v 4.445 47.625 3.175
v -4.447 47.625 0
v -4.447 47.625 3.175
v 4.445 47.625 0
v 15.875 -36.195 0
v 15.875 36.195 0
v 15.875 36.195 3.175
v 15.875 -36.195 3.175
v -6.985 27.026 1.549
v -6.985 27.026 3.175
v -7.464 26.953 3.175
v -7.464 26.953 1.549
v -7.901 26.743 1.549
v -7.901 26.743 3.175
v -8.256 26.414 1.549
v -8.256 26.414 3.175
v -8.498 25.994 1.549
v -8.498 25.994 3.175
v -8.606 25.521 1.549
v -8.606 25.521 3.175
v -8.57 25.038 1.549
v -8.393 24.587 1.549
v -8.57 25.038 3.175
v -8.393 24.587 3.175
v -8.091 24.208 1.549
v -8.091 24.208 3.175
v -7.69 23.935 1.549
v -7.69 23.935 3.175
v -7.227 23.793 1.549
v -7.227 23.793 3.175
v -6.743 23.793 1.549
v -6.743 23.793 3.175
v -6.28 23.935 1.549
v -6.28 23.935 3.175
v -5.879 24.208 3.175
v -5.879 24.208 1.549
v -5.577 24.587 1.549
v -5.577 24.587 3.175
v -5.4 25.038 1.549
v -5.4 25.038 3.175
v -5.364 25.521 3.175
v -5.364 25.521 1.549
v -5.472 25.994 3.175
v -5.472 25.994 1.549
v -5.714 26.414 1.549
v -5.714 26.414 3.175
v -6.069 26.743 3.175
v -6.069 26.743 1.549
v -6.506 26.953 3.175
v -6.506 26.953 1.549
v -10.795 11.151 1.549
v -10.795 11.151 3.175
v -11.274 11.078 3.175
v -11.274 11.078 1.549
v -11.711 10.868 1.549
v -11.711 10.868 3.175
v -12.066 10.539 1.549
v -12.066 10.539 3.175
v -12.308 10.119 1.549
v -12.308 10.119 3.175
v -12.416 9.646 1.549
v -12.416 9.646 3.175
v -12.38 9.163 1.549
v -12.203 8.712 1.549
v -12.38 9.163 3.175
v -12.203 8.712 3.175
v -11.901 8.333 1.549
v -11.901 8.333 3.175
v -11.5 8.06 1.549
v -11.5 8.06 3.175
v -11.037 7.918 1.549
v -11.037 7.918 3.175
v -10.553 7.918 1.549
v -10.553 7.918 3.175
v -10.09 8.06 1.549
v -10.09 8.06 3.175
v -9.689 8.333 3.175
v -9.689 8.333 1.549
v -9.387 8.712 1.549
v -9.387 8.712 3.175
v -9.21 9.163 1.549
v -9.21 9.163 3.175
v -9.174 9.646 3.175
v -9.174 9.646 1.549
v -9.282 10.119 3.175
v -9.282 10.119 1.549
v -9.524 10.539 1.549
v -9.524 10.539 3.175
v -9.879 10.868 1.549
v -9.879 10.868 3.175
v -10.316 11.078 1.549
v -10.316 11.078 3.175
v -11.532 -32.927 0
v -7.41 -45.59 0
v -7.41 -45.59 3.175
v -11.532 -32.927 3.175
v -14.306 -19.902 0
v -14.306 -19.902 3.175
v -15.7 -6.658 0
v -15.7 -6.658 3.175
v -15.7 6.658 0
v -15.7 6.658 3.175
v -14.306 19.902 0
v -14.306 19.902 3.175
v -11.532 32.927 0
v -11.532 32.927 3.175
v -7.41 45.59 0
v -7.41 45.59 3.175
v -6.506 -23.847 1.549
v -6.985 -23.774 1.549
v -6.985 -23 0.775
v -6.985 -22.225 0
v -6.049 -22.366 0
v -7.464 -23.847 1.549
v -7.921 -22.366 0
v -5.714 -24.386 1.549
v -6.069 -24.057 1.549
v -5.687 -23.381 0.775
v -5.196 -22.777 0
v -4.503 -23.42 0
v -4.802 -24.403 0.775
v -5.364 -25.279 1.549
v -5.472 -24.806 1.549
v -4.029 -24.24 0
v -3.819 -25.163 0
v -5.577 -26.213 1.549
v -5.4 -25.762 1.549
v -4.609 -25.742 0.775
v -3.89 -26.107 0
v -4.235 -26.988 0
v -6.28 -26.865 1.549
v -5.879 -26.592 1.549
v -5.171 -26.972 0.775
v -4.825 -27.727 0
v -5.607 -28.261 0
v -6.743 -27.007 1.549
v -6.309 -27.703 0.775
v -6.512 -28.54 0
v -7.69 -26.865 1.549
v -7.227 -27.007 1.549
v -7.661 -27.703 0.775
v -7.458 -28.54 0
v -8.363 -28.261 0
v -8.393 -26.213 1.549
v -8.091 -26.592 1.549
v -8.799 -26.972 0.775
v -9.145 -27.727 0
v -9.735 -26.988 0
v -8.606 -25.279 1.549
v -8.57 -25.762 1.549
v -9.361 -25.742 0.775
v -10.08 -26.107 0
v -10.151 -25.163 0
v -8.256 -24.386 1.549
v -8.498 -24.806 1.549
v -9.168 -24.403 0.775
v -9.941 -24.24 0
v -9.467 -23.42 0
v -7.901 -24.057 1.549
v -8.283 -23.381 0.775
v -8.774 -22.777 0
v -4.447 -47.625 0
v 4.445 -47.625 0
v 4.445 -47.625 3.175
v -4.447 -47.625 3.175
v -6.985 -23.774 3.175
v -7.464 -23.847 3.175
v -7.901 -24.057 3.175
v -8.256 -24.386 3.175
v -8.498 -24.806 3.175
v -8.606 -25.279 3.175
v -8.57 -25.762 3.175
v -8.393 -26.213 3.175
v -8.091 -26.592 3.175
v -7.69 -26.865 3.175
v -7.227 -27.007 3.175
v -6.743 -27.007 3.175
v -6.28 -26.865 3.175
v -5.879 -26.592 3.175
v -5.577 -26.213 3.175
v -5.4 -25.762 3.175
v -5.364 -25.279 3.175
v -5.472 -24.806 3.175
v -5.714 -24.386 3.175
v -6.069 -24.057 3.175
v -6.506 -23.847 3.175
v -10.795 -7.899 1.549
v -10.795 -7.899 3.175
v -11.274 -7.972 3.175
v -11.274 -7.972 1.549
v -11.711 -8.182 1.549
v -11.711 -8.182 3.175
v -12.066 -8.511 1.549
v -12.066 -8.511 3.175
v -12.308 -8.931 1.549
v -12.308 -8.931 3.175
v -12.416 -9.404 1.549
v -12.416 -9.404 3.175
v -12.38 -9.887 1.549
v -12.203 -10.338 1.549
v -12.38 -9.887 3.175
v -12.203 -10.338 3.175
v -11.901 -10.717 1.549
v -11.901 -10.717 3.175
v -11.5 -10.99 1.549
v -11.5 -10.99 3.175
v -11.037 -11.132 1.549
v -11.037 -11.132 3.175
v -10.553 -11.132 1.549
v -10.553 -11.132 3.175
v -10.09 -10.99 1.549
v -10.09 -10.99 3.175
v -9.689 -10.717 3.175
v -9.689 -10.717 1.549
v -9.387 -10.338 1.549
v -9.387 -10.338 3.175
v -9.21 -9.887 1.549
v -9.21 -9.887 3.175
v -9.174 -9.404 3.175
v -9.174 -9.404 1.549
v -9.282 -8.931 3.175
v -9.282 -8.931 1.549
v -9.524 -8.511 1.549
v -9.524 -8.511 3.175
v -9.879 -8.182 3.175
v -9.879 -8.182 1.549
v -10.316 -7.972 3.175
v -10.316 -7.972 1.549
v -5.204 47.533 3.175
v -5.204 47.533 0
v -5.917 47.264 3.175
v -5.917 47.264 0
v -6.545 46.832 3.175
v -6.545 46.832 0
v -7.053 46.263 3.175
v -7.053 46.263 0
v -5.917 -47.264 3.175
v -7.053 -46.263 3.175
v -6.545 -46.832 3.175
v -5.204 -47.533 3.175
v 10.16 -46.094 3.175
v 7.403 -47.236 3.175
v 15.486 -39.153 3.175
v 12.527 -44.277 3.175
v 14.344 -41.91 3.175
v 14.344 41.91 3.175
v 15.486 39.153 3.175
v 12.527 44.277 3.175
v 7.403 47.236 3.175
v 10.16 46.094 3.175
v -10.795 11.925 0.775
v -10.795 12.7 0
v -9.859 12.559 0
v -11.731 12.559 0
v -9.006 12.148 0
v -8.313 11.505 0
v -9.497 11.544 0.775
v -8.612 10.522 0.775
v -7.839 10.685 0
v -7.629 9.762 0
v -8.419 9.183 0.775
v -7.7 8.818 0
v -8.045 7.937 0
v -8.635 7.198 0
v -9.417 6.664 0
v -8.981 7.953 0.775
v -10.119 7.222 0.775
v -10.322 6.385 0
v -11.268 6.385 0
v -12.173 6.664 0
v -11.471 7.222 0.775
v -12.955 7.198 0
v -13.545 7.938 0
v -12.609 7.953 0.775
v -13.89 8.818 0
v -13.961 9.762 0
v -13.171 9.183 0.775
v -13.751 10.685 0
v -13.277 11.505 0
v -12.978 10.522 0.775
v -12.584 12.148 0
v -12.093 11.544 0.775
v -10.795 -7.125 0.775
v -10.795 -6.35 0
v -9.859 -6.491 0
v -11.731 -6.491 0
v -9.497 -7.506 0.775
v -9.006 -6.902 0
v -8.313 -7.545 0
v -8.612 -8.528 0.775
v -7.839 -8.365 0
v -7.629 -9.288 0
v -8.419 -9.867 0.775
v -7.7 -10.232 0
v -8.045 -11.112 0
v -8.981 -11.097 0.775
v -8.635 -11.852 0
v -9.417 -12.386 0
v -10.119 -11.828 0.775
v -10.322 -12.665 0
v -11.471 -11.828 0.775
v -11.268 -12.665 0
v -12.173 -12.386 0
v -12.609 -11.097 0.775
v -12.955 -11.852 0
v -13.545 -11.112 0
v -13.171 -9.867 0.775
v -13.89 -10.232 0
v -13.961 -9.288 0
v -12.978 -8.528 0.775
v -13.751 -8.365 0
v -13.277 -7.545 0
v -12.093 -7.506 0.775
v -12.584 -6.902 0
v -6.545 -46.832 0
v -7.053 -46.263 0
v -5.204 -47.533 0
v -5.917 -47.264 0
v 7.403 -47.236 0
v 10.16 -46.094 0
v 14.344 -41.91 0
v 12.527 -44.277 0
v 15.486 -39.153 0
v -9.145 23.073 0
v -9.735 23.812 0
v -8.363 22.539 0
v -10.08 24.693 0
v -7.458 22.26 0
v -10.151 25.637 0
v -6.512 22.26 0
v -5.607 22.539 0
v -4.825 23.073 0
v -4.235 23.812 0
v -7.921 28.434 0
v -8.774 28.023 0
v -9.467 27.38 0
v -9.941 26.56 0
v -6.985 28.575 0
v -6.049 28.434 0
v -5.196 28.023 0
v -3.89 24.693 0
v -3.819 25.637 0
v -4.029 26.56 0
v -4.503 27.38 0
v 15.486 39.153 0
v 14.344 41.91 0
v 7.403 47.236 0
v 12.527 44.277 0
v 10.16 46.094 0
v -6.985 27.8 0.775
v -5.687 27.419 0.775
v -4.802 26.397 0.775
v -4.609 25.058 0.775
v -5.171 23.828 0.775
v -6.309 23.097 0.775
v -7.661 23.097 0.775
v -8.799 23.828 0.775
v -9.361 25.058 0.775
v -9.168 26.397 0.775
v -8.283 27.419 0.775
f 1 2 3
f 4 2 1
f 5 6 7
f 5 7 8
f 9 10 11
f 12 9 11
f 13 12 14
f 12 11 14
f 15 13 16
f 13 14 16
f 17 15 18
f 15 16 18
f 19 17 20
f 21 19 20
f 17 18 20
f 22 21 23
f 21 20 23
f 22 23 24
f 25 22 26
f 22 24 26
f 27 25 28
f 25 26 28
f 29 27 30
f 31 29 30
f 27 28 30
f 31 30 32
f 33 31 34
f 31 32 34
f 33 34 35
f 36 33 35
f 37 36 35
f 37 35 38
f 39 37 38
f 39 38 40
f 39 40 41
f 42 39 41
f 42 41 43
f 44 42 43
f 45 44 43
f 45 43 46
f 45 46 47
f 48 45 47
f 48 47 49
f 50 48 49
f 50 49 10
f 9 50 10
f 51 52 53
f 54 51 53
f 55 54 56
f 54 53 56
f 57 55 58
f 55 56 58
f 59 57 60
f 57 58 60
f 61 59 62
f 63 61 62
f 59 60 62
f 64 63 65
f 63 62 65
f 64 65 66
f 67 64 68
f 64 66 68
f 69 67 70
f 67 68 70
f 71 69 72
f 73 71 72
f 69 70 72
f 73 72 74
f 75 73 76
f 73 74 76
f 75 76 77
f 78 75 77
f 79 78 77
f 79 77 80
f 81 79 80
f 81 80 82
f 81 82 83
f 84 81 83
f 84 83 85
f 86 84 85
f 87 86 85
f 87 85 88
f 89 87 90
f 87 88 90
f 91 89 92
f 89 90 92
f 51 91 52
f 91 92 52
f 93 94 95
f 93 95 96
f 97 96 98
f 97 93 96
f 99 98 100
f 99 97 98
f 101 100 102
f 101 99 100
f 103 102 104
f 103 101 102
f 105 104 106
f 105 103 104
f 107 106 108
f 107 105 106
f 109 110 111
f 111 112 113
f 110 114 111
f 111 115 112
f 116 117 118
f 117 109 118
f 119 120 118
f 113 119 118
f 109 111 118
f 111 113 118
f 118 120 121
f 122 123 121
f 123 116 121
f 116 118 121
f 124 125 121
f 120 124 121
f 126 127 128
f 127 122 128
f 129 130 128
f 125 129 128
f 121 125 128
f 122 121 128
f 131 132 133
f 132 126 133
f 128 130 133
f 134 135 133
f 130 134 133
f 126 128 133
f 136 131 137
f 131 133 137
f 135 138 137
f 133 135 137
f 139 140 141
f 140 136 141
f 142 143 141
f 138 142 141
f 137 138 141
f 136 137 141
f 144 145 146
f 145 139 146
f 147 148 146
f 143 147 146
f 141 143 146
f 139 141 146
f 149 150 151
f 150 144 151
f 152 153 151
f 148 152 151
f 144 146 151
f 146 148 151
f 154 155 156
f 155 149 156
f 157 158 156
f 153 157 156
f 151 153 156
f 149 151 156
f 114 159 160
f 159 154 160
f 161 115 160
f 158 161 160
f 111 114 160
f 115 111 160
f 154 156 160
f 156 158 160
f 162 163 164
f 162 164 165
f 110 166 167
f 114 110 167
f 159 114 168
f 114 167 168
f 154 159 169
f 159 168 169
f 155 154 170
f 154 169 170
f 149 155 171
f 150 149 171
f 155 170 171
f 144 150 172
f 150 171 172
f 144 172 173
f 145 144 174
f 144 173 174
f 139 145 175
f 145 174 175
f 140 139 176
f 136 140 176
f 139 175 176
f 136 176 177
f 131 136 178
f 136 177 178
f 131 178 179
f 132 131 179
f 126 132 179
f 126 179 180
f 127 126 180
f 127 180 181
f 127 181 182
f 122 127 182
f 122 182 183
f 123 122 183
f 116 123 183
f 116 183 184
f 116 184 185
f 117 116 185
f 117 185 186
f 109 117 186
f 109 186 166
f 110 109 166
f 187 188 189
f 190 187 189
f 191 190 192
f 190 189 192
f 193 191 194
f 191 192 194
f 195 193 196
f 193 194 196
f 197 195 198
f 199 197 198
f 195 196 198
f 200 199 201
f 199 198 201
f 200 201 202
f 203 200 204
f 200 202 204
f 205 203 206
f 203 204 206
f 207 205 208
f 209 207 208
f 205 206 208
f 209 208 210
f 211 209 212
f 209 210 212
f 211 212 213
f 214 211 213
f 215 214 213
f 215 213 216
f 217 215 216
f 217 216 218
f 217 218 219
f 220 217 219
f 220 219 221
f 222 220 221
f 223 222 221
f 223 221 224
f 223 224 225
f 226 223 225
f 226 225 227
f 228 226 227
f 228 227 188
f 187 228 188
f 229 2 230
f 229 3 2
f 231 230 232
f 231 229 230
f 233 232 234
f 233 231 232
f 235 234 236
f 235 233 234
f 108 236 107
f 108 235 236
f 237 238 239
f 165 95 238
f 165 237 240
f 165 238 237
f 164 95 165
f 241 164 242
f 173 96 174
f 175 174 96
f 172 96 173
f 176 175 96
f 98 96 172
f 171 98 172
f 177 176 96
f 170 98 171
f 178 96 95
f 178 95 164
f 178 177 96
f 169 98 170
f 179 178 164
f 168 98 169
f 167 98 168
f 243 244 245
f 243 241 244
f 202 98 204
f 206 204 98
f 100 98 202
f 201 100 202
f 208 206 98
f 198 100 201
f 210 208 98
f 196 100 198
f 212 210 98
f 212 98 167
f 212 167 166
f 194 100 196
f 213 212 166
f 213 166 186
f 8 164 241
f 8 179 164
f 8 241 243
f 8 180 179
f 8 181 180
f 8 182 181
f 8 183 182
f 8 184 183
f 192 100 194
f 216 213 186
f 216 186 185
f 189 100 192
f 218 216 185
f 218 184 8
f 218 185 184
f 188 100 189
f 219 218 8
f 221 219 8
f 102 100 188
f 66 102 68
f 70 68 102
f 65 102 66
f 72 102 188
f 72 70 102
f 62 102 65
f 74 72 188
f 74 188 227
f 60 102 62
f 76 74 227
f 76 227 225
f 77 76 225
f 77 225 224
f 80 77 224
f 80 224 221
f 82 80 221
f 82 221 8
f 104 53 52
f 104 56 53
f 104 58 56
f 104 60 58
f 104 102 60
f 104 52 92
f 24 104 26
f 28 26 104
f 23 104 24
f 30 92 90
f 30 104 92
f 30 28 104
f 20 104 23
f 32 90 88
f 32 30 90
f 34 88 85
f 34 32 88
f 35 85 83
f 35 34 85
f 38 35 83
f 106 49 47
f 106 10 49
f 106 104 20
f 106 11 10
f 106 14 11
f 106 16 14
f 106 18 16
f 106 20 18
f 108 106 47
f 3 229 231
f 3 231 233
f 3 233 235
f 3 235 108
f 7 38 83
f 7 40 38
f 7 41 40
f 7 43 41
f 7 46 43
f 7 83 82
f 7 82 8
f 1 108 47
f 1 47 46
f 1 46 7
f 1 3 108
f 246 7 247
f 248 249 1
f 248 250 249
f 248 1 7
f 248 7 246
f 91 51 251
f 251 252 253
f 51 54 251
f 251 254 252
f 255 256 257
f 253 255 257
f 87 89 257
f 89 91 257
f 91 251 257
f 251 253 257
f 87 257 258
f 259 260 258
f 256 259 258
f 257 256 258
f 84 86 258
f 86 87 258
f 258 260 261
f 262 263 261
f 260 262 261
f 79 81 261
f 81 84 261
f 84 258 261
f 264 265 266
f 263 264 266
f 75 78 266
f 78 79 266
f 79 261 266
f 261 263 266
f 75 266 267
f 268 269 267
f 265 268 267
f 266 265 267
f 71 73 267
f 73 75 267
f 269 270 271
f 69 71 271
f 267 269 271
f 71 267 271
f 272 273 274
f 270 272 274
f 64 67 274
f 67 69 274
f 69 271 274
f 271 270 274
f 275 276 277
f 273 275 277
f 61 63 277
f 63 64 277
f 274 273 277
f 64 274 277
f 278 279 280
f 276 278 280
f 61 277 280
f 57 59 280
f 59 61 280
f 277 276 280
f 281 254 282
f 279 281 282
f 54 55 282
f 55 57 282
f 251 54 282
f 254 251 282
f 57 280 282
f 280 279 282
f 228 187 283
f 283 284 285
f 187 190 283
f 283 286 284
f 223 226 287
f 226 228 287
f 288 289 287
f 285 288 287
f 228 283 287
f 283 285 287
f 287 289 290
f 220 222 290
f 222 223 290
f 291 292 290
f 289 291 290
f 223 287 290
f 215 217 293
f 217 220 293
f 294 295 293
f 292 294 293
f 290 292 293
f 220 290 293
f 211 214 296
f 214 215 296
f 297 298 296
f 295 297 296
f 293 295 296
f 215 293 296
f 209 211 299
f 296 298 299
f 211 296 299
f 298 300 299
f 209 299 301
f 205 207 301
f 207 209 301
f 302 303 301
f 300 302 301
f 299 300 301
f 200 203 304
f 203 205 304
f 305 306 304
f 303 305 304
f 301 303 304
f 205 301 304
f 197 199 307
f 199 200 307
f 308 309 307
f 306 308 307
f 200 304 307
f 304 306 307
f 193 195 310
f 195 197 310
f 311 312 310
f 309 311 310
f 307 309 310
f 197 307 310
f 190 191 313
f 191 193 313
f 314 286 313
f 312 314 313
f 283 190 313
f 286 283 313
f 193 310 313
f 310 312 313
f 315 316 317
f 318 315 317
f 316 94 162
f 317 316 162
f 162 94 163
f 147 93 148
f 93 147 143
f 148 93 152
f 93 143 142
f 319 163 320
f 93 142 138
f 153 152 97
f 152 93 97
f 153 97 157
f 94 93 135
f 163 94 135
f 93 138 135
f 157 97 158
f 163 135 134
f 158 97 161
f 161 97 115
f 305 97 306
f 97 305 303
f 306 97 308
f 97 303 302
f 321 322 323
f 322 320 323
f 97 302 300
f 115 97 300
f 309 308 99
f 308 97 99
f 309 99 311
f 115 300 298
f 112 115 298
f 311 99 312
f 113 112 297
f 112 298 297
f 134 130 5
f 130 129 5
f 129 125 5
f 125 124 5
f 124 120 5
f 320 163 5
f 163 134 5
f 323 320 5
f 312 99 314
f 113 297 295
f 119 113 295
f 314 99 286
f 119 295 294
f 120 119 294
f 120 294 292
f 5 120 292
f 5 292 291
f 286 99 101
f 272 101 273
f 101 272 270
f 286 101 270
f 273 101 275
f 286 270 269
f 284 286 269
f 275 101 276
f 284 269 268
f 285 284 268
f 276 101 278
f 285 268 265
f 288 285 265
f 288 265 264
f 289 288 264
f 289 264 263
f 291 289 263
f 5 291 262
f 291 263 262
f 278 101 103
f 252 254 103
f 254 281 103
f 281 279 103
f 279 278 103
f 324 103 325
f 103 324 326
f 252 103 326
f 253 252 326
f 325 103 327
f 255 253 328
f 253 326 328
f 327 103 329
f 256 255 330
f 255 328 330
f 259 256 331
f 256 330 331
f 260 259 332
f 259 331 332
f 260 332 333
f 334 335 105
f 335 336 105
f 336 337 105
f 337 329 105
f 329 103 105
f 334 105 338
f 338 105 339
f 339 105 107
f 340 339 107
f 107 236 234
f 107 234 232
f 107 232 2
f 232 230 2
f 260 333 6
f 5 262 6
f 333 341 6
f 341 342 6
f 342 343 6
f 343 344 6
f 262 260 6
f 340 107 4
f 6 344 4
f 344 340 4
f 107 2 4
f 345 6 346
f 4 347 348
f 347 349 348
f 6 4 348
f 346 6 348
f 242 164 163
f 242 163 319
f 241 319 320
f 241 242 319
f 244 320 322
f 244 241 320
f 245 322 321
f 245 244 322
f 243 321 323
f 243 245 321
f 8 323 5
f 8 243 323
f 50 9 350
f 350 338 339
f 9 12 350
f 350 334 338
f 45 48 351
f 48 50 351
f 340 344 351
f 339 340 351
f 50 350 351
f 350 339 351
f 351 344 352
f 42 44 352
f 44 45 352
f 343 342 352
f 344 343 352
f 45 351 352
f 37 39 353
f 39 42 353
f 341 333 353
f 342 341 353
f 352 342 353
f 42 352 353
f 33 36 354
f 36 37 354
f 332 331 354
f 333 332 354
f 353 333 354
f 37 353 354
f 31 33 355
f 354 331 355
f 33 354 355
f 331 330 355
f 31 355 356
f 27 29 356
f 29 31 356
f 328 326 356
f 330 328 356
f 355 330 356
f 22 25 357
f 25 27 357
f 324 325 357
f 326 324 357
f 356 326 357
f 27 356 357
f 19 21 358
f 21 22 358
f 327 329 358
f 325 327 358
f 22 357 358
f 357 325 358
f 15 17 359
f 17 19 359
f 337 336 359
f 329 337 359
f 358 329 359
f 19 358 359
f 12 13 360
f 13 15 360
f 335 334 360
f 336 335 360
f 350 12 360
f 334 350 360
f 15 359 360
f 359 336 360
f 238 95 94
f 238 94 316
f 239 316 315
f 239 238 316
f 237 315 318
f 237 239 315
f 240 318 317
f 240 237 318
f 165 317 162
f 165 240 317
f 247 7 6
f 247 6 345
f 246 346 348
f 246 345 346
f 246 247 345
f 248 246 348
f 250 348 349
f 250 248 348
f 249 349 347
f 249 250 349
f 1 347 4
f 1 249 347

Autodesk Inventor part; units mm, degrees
ref_plane "YZ Plane" through (0, 0, 0) normal (1, 0, 0) x (0, 1, 0)
ref_plane "XZ Plane" through (0, 0, 0) normal (0, 1, 0) x (-1, 0, 0)
ref_plane "XY Plane" through (0, 0, 0) normal (0, 0, 1) x (1, 0, 0)
sketch "Sketch1" plane through (0, 0, 0) normal (0, 0, 1) x (1, 0, 0)
  line L0 (0, 177.8) -> (0, -177.8) projected
  line L1 (-66.675, 0) -> (288.925, 0) projected
  line L2 (15.875, -47.625) -> (-15.875, -47.625)
  line L3 (-15.875, -47.625) -> (-15.875, 47.625)
  line L4 (-15.875, 47.625) -> (15.875, 47.625)
  line L5 (15.875, 47.625) -> (15.875, -47.625)
  line L6 (0, 0) -> (0, 35.5411)
  circle A0 centre (71.6788, 0) radius 60.6679 construction
  circle A1 centre (71.6788, 0) radius 56.8579 construction
  circle A2 centre (71.6788, 0) radius 83.5279 construction
  line L7 (0, 47.625) -> (-15.875, 34.925) construction
  circle A3 centre (111.125, 0) radius 127
  point P0 (-10.795, 9.525)
  point P1 (-10.795, -9.525)
  point P2 (-6.985, 25.4)
  point P3 (-6.985, -25.4)
  dimension "d0" = 31.75
  dimension "d15" = 47.625
  dimension "d16" = 47.625
  dimension "d20" = 0
  dimension "d21" = 71.6788
  dimension "d22" = 121.3358
  dimension "d23" = 3.81
  dimension "d25" = 22.86
  dimension "d26" = 15.875
  dimension "d27" = 12.7
  dimension "d28" = 9.525
  dimension "d29" = 9.525
  dimension "d32" = 8.89
  dimension "d33" = 5.08
  dimension "d34" = 15.875
  dimension "d35" = 15.875
  dimension "d36" = 254
  dimension "d37" = 127
extrude "Extrusion1" add sketch "Sketch1" along normal blind 3.175 contours L1 A3 L4 L0 | L1 L5 L2 L0 | L0 L2 A3 L1 | L0 L4 L5 L1 | A3 L2 L3 | L3 L4 A3
hole "Hole1" at (-10.795, 9.525, 0) at (-10.795, -9.525, 0) at (-6.985, 25.4, 0) at (-6.985, -25.4, 0) direction (0, 0, 1) diameter 3.2512 end through all countersink diameter 6.35 countersink angle 90
fillet "Fillet1" radius 11.43 2 edges at (15.875, 47.625, 1.5875) (15.875, -47.625, 1.5875)
sketch "Sketch2" plane through (0, 0, 0) normal (0, 0, 1) x (1, 0, 0)
  circle A0 centre (111.125, 0) radius 127 projected
  line L0 (4.445, 47.625) -> (-15.875, 47.625) projected
  line L1 (-15.875, -47.625) -> (4.445, -47.625) projected
  line L2 (-15.875, 47.625) -> (-15.875, -47.625) projected
  arc A1 (-6.6072, 47.625) -> (-6.6072, -47.625) centre (111.125, 0) ccw
  line L3 (-6.6072, 47.625) -> (-15.875, 47.625)
  line L4 (-15.875, 0) -> (-15.875, -47.625)
  line L5 (-15.875, -47.625) -> (-6.6072, -47.625)
  line L6 (-15.875, 47.625) -> (-15.875, 0)
  point P0 (0, 0)
extrude "Extrusion2" cut sketch "Sketch2" along normal blind 25.4 contours A0 L2 L0 | L1 L2 A0
fillet "Fillet2" radius 3.175 2 edges at (-6.6072, 47.625, 1.5875) (-6.6072, -47.625, 1.5875)
equation "\"d26\" = 0.5 * d0"
properties part number "J005322" material "STEEL, LOW CARBON (1008/1018/1020)"
